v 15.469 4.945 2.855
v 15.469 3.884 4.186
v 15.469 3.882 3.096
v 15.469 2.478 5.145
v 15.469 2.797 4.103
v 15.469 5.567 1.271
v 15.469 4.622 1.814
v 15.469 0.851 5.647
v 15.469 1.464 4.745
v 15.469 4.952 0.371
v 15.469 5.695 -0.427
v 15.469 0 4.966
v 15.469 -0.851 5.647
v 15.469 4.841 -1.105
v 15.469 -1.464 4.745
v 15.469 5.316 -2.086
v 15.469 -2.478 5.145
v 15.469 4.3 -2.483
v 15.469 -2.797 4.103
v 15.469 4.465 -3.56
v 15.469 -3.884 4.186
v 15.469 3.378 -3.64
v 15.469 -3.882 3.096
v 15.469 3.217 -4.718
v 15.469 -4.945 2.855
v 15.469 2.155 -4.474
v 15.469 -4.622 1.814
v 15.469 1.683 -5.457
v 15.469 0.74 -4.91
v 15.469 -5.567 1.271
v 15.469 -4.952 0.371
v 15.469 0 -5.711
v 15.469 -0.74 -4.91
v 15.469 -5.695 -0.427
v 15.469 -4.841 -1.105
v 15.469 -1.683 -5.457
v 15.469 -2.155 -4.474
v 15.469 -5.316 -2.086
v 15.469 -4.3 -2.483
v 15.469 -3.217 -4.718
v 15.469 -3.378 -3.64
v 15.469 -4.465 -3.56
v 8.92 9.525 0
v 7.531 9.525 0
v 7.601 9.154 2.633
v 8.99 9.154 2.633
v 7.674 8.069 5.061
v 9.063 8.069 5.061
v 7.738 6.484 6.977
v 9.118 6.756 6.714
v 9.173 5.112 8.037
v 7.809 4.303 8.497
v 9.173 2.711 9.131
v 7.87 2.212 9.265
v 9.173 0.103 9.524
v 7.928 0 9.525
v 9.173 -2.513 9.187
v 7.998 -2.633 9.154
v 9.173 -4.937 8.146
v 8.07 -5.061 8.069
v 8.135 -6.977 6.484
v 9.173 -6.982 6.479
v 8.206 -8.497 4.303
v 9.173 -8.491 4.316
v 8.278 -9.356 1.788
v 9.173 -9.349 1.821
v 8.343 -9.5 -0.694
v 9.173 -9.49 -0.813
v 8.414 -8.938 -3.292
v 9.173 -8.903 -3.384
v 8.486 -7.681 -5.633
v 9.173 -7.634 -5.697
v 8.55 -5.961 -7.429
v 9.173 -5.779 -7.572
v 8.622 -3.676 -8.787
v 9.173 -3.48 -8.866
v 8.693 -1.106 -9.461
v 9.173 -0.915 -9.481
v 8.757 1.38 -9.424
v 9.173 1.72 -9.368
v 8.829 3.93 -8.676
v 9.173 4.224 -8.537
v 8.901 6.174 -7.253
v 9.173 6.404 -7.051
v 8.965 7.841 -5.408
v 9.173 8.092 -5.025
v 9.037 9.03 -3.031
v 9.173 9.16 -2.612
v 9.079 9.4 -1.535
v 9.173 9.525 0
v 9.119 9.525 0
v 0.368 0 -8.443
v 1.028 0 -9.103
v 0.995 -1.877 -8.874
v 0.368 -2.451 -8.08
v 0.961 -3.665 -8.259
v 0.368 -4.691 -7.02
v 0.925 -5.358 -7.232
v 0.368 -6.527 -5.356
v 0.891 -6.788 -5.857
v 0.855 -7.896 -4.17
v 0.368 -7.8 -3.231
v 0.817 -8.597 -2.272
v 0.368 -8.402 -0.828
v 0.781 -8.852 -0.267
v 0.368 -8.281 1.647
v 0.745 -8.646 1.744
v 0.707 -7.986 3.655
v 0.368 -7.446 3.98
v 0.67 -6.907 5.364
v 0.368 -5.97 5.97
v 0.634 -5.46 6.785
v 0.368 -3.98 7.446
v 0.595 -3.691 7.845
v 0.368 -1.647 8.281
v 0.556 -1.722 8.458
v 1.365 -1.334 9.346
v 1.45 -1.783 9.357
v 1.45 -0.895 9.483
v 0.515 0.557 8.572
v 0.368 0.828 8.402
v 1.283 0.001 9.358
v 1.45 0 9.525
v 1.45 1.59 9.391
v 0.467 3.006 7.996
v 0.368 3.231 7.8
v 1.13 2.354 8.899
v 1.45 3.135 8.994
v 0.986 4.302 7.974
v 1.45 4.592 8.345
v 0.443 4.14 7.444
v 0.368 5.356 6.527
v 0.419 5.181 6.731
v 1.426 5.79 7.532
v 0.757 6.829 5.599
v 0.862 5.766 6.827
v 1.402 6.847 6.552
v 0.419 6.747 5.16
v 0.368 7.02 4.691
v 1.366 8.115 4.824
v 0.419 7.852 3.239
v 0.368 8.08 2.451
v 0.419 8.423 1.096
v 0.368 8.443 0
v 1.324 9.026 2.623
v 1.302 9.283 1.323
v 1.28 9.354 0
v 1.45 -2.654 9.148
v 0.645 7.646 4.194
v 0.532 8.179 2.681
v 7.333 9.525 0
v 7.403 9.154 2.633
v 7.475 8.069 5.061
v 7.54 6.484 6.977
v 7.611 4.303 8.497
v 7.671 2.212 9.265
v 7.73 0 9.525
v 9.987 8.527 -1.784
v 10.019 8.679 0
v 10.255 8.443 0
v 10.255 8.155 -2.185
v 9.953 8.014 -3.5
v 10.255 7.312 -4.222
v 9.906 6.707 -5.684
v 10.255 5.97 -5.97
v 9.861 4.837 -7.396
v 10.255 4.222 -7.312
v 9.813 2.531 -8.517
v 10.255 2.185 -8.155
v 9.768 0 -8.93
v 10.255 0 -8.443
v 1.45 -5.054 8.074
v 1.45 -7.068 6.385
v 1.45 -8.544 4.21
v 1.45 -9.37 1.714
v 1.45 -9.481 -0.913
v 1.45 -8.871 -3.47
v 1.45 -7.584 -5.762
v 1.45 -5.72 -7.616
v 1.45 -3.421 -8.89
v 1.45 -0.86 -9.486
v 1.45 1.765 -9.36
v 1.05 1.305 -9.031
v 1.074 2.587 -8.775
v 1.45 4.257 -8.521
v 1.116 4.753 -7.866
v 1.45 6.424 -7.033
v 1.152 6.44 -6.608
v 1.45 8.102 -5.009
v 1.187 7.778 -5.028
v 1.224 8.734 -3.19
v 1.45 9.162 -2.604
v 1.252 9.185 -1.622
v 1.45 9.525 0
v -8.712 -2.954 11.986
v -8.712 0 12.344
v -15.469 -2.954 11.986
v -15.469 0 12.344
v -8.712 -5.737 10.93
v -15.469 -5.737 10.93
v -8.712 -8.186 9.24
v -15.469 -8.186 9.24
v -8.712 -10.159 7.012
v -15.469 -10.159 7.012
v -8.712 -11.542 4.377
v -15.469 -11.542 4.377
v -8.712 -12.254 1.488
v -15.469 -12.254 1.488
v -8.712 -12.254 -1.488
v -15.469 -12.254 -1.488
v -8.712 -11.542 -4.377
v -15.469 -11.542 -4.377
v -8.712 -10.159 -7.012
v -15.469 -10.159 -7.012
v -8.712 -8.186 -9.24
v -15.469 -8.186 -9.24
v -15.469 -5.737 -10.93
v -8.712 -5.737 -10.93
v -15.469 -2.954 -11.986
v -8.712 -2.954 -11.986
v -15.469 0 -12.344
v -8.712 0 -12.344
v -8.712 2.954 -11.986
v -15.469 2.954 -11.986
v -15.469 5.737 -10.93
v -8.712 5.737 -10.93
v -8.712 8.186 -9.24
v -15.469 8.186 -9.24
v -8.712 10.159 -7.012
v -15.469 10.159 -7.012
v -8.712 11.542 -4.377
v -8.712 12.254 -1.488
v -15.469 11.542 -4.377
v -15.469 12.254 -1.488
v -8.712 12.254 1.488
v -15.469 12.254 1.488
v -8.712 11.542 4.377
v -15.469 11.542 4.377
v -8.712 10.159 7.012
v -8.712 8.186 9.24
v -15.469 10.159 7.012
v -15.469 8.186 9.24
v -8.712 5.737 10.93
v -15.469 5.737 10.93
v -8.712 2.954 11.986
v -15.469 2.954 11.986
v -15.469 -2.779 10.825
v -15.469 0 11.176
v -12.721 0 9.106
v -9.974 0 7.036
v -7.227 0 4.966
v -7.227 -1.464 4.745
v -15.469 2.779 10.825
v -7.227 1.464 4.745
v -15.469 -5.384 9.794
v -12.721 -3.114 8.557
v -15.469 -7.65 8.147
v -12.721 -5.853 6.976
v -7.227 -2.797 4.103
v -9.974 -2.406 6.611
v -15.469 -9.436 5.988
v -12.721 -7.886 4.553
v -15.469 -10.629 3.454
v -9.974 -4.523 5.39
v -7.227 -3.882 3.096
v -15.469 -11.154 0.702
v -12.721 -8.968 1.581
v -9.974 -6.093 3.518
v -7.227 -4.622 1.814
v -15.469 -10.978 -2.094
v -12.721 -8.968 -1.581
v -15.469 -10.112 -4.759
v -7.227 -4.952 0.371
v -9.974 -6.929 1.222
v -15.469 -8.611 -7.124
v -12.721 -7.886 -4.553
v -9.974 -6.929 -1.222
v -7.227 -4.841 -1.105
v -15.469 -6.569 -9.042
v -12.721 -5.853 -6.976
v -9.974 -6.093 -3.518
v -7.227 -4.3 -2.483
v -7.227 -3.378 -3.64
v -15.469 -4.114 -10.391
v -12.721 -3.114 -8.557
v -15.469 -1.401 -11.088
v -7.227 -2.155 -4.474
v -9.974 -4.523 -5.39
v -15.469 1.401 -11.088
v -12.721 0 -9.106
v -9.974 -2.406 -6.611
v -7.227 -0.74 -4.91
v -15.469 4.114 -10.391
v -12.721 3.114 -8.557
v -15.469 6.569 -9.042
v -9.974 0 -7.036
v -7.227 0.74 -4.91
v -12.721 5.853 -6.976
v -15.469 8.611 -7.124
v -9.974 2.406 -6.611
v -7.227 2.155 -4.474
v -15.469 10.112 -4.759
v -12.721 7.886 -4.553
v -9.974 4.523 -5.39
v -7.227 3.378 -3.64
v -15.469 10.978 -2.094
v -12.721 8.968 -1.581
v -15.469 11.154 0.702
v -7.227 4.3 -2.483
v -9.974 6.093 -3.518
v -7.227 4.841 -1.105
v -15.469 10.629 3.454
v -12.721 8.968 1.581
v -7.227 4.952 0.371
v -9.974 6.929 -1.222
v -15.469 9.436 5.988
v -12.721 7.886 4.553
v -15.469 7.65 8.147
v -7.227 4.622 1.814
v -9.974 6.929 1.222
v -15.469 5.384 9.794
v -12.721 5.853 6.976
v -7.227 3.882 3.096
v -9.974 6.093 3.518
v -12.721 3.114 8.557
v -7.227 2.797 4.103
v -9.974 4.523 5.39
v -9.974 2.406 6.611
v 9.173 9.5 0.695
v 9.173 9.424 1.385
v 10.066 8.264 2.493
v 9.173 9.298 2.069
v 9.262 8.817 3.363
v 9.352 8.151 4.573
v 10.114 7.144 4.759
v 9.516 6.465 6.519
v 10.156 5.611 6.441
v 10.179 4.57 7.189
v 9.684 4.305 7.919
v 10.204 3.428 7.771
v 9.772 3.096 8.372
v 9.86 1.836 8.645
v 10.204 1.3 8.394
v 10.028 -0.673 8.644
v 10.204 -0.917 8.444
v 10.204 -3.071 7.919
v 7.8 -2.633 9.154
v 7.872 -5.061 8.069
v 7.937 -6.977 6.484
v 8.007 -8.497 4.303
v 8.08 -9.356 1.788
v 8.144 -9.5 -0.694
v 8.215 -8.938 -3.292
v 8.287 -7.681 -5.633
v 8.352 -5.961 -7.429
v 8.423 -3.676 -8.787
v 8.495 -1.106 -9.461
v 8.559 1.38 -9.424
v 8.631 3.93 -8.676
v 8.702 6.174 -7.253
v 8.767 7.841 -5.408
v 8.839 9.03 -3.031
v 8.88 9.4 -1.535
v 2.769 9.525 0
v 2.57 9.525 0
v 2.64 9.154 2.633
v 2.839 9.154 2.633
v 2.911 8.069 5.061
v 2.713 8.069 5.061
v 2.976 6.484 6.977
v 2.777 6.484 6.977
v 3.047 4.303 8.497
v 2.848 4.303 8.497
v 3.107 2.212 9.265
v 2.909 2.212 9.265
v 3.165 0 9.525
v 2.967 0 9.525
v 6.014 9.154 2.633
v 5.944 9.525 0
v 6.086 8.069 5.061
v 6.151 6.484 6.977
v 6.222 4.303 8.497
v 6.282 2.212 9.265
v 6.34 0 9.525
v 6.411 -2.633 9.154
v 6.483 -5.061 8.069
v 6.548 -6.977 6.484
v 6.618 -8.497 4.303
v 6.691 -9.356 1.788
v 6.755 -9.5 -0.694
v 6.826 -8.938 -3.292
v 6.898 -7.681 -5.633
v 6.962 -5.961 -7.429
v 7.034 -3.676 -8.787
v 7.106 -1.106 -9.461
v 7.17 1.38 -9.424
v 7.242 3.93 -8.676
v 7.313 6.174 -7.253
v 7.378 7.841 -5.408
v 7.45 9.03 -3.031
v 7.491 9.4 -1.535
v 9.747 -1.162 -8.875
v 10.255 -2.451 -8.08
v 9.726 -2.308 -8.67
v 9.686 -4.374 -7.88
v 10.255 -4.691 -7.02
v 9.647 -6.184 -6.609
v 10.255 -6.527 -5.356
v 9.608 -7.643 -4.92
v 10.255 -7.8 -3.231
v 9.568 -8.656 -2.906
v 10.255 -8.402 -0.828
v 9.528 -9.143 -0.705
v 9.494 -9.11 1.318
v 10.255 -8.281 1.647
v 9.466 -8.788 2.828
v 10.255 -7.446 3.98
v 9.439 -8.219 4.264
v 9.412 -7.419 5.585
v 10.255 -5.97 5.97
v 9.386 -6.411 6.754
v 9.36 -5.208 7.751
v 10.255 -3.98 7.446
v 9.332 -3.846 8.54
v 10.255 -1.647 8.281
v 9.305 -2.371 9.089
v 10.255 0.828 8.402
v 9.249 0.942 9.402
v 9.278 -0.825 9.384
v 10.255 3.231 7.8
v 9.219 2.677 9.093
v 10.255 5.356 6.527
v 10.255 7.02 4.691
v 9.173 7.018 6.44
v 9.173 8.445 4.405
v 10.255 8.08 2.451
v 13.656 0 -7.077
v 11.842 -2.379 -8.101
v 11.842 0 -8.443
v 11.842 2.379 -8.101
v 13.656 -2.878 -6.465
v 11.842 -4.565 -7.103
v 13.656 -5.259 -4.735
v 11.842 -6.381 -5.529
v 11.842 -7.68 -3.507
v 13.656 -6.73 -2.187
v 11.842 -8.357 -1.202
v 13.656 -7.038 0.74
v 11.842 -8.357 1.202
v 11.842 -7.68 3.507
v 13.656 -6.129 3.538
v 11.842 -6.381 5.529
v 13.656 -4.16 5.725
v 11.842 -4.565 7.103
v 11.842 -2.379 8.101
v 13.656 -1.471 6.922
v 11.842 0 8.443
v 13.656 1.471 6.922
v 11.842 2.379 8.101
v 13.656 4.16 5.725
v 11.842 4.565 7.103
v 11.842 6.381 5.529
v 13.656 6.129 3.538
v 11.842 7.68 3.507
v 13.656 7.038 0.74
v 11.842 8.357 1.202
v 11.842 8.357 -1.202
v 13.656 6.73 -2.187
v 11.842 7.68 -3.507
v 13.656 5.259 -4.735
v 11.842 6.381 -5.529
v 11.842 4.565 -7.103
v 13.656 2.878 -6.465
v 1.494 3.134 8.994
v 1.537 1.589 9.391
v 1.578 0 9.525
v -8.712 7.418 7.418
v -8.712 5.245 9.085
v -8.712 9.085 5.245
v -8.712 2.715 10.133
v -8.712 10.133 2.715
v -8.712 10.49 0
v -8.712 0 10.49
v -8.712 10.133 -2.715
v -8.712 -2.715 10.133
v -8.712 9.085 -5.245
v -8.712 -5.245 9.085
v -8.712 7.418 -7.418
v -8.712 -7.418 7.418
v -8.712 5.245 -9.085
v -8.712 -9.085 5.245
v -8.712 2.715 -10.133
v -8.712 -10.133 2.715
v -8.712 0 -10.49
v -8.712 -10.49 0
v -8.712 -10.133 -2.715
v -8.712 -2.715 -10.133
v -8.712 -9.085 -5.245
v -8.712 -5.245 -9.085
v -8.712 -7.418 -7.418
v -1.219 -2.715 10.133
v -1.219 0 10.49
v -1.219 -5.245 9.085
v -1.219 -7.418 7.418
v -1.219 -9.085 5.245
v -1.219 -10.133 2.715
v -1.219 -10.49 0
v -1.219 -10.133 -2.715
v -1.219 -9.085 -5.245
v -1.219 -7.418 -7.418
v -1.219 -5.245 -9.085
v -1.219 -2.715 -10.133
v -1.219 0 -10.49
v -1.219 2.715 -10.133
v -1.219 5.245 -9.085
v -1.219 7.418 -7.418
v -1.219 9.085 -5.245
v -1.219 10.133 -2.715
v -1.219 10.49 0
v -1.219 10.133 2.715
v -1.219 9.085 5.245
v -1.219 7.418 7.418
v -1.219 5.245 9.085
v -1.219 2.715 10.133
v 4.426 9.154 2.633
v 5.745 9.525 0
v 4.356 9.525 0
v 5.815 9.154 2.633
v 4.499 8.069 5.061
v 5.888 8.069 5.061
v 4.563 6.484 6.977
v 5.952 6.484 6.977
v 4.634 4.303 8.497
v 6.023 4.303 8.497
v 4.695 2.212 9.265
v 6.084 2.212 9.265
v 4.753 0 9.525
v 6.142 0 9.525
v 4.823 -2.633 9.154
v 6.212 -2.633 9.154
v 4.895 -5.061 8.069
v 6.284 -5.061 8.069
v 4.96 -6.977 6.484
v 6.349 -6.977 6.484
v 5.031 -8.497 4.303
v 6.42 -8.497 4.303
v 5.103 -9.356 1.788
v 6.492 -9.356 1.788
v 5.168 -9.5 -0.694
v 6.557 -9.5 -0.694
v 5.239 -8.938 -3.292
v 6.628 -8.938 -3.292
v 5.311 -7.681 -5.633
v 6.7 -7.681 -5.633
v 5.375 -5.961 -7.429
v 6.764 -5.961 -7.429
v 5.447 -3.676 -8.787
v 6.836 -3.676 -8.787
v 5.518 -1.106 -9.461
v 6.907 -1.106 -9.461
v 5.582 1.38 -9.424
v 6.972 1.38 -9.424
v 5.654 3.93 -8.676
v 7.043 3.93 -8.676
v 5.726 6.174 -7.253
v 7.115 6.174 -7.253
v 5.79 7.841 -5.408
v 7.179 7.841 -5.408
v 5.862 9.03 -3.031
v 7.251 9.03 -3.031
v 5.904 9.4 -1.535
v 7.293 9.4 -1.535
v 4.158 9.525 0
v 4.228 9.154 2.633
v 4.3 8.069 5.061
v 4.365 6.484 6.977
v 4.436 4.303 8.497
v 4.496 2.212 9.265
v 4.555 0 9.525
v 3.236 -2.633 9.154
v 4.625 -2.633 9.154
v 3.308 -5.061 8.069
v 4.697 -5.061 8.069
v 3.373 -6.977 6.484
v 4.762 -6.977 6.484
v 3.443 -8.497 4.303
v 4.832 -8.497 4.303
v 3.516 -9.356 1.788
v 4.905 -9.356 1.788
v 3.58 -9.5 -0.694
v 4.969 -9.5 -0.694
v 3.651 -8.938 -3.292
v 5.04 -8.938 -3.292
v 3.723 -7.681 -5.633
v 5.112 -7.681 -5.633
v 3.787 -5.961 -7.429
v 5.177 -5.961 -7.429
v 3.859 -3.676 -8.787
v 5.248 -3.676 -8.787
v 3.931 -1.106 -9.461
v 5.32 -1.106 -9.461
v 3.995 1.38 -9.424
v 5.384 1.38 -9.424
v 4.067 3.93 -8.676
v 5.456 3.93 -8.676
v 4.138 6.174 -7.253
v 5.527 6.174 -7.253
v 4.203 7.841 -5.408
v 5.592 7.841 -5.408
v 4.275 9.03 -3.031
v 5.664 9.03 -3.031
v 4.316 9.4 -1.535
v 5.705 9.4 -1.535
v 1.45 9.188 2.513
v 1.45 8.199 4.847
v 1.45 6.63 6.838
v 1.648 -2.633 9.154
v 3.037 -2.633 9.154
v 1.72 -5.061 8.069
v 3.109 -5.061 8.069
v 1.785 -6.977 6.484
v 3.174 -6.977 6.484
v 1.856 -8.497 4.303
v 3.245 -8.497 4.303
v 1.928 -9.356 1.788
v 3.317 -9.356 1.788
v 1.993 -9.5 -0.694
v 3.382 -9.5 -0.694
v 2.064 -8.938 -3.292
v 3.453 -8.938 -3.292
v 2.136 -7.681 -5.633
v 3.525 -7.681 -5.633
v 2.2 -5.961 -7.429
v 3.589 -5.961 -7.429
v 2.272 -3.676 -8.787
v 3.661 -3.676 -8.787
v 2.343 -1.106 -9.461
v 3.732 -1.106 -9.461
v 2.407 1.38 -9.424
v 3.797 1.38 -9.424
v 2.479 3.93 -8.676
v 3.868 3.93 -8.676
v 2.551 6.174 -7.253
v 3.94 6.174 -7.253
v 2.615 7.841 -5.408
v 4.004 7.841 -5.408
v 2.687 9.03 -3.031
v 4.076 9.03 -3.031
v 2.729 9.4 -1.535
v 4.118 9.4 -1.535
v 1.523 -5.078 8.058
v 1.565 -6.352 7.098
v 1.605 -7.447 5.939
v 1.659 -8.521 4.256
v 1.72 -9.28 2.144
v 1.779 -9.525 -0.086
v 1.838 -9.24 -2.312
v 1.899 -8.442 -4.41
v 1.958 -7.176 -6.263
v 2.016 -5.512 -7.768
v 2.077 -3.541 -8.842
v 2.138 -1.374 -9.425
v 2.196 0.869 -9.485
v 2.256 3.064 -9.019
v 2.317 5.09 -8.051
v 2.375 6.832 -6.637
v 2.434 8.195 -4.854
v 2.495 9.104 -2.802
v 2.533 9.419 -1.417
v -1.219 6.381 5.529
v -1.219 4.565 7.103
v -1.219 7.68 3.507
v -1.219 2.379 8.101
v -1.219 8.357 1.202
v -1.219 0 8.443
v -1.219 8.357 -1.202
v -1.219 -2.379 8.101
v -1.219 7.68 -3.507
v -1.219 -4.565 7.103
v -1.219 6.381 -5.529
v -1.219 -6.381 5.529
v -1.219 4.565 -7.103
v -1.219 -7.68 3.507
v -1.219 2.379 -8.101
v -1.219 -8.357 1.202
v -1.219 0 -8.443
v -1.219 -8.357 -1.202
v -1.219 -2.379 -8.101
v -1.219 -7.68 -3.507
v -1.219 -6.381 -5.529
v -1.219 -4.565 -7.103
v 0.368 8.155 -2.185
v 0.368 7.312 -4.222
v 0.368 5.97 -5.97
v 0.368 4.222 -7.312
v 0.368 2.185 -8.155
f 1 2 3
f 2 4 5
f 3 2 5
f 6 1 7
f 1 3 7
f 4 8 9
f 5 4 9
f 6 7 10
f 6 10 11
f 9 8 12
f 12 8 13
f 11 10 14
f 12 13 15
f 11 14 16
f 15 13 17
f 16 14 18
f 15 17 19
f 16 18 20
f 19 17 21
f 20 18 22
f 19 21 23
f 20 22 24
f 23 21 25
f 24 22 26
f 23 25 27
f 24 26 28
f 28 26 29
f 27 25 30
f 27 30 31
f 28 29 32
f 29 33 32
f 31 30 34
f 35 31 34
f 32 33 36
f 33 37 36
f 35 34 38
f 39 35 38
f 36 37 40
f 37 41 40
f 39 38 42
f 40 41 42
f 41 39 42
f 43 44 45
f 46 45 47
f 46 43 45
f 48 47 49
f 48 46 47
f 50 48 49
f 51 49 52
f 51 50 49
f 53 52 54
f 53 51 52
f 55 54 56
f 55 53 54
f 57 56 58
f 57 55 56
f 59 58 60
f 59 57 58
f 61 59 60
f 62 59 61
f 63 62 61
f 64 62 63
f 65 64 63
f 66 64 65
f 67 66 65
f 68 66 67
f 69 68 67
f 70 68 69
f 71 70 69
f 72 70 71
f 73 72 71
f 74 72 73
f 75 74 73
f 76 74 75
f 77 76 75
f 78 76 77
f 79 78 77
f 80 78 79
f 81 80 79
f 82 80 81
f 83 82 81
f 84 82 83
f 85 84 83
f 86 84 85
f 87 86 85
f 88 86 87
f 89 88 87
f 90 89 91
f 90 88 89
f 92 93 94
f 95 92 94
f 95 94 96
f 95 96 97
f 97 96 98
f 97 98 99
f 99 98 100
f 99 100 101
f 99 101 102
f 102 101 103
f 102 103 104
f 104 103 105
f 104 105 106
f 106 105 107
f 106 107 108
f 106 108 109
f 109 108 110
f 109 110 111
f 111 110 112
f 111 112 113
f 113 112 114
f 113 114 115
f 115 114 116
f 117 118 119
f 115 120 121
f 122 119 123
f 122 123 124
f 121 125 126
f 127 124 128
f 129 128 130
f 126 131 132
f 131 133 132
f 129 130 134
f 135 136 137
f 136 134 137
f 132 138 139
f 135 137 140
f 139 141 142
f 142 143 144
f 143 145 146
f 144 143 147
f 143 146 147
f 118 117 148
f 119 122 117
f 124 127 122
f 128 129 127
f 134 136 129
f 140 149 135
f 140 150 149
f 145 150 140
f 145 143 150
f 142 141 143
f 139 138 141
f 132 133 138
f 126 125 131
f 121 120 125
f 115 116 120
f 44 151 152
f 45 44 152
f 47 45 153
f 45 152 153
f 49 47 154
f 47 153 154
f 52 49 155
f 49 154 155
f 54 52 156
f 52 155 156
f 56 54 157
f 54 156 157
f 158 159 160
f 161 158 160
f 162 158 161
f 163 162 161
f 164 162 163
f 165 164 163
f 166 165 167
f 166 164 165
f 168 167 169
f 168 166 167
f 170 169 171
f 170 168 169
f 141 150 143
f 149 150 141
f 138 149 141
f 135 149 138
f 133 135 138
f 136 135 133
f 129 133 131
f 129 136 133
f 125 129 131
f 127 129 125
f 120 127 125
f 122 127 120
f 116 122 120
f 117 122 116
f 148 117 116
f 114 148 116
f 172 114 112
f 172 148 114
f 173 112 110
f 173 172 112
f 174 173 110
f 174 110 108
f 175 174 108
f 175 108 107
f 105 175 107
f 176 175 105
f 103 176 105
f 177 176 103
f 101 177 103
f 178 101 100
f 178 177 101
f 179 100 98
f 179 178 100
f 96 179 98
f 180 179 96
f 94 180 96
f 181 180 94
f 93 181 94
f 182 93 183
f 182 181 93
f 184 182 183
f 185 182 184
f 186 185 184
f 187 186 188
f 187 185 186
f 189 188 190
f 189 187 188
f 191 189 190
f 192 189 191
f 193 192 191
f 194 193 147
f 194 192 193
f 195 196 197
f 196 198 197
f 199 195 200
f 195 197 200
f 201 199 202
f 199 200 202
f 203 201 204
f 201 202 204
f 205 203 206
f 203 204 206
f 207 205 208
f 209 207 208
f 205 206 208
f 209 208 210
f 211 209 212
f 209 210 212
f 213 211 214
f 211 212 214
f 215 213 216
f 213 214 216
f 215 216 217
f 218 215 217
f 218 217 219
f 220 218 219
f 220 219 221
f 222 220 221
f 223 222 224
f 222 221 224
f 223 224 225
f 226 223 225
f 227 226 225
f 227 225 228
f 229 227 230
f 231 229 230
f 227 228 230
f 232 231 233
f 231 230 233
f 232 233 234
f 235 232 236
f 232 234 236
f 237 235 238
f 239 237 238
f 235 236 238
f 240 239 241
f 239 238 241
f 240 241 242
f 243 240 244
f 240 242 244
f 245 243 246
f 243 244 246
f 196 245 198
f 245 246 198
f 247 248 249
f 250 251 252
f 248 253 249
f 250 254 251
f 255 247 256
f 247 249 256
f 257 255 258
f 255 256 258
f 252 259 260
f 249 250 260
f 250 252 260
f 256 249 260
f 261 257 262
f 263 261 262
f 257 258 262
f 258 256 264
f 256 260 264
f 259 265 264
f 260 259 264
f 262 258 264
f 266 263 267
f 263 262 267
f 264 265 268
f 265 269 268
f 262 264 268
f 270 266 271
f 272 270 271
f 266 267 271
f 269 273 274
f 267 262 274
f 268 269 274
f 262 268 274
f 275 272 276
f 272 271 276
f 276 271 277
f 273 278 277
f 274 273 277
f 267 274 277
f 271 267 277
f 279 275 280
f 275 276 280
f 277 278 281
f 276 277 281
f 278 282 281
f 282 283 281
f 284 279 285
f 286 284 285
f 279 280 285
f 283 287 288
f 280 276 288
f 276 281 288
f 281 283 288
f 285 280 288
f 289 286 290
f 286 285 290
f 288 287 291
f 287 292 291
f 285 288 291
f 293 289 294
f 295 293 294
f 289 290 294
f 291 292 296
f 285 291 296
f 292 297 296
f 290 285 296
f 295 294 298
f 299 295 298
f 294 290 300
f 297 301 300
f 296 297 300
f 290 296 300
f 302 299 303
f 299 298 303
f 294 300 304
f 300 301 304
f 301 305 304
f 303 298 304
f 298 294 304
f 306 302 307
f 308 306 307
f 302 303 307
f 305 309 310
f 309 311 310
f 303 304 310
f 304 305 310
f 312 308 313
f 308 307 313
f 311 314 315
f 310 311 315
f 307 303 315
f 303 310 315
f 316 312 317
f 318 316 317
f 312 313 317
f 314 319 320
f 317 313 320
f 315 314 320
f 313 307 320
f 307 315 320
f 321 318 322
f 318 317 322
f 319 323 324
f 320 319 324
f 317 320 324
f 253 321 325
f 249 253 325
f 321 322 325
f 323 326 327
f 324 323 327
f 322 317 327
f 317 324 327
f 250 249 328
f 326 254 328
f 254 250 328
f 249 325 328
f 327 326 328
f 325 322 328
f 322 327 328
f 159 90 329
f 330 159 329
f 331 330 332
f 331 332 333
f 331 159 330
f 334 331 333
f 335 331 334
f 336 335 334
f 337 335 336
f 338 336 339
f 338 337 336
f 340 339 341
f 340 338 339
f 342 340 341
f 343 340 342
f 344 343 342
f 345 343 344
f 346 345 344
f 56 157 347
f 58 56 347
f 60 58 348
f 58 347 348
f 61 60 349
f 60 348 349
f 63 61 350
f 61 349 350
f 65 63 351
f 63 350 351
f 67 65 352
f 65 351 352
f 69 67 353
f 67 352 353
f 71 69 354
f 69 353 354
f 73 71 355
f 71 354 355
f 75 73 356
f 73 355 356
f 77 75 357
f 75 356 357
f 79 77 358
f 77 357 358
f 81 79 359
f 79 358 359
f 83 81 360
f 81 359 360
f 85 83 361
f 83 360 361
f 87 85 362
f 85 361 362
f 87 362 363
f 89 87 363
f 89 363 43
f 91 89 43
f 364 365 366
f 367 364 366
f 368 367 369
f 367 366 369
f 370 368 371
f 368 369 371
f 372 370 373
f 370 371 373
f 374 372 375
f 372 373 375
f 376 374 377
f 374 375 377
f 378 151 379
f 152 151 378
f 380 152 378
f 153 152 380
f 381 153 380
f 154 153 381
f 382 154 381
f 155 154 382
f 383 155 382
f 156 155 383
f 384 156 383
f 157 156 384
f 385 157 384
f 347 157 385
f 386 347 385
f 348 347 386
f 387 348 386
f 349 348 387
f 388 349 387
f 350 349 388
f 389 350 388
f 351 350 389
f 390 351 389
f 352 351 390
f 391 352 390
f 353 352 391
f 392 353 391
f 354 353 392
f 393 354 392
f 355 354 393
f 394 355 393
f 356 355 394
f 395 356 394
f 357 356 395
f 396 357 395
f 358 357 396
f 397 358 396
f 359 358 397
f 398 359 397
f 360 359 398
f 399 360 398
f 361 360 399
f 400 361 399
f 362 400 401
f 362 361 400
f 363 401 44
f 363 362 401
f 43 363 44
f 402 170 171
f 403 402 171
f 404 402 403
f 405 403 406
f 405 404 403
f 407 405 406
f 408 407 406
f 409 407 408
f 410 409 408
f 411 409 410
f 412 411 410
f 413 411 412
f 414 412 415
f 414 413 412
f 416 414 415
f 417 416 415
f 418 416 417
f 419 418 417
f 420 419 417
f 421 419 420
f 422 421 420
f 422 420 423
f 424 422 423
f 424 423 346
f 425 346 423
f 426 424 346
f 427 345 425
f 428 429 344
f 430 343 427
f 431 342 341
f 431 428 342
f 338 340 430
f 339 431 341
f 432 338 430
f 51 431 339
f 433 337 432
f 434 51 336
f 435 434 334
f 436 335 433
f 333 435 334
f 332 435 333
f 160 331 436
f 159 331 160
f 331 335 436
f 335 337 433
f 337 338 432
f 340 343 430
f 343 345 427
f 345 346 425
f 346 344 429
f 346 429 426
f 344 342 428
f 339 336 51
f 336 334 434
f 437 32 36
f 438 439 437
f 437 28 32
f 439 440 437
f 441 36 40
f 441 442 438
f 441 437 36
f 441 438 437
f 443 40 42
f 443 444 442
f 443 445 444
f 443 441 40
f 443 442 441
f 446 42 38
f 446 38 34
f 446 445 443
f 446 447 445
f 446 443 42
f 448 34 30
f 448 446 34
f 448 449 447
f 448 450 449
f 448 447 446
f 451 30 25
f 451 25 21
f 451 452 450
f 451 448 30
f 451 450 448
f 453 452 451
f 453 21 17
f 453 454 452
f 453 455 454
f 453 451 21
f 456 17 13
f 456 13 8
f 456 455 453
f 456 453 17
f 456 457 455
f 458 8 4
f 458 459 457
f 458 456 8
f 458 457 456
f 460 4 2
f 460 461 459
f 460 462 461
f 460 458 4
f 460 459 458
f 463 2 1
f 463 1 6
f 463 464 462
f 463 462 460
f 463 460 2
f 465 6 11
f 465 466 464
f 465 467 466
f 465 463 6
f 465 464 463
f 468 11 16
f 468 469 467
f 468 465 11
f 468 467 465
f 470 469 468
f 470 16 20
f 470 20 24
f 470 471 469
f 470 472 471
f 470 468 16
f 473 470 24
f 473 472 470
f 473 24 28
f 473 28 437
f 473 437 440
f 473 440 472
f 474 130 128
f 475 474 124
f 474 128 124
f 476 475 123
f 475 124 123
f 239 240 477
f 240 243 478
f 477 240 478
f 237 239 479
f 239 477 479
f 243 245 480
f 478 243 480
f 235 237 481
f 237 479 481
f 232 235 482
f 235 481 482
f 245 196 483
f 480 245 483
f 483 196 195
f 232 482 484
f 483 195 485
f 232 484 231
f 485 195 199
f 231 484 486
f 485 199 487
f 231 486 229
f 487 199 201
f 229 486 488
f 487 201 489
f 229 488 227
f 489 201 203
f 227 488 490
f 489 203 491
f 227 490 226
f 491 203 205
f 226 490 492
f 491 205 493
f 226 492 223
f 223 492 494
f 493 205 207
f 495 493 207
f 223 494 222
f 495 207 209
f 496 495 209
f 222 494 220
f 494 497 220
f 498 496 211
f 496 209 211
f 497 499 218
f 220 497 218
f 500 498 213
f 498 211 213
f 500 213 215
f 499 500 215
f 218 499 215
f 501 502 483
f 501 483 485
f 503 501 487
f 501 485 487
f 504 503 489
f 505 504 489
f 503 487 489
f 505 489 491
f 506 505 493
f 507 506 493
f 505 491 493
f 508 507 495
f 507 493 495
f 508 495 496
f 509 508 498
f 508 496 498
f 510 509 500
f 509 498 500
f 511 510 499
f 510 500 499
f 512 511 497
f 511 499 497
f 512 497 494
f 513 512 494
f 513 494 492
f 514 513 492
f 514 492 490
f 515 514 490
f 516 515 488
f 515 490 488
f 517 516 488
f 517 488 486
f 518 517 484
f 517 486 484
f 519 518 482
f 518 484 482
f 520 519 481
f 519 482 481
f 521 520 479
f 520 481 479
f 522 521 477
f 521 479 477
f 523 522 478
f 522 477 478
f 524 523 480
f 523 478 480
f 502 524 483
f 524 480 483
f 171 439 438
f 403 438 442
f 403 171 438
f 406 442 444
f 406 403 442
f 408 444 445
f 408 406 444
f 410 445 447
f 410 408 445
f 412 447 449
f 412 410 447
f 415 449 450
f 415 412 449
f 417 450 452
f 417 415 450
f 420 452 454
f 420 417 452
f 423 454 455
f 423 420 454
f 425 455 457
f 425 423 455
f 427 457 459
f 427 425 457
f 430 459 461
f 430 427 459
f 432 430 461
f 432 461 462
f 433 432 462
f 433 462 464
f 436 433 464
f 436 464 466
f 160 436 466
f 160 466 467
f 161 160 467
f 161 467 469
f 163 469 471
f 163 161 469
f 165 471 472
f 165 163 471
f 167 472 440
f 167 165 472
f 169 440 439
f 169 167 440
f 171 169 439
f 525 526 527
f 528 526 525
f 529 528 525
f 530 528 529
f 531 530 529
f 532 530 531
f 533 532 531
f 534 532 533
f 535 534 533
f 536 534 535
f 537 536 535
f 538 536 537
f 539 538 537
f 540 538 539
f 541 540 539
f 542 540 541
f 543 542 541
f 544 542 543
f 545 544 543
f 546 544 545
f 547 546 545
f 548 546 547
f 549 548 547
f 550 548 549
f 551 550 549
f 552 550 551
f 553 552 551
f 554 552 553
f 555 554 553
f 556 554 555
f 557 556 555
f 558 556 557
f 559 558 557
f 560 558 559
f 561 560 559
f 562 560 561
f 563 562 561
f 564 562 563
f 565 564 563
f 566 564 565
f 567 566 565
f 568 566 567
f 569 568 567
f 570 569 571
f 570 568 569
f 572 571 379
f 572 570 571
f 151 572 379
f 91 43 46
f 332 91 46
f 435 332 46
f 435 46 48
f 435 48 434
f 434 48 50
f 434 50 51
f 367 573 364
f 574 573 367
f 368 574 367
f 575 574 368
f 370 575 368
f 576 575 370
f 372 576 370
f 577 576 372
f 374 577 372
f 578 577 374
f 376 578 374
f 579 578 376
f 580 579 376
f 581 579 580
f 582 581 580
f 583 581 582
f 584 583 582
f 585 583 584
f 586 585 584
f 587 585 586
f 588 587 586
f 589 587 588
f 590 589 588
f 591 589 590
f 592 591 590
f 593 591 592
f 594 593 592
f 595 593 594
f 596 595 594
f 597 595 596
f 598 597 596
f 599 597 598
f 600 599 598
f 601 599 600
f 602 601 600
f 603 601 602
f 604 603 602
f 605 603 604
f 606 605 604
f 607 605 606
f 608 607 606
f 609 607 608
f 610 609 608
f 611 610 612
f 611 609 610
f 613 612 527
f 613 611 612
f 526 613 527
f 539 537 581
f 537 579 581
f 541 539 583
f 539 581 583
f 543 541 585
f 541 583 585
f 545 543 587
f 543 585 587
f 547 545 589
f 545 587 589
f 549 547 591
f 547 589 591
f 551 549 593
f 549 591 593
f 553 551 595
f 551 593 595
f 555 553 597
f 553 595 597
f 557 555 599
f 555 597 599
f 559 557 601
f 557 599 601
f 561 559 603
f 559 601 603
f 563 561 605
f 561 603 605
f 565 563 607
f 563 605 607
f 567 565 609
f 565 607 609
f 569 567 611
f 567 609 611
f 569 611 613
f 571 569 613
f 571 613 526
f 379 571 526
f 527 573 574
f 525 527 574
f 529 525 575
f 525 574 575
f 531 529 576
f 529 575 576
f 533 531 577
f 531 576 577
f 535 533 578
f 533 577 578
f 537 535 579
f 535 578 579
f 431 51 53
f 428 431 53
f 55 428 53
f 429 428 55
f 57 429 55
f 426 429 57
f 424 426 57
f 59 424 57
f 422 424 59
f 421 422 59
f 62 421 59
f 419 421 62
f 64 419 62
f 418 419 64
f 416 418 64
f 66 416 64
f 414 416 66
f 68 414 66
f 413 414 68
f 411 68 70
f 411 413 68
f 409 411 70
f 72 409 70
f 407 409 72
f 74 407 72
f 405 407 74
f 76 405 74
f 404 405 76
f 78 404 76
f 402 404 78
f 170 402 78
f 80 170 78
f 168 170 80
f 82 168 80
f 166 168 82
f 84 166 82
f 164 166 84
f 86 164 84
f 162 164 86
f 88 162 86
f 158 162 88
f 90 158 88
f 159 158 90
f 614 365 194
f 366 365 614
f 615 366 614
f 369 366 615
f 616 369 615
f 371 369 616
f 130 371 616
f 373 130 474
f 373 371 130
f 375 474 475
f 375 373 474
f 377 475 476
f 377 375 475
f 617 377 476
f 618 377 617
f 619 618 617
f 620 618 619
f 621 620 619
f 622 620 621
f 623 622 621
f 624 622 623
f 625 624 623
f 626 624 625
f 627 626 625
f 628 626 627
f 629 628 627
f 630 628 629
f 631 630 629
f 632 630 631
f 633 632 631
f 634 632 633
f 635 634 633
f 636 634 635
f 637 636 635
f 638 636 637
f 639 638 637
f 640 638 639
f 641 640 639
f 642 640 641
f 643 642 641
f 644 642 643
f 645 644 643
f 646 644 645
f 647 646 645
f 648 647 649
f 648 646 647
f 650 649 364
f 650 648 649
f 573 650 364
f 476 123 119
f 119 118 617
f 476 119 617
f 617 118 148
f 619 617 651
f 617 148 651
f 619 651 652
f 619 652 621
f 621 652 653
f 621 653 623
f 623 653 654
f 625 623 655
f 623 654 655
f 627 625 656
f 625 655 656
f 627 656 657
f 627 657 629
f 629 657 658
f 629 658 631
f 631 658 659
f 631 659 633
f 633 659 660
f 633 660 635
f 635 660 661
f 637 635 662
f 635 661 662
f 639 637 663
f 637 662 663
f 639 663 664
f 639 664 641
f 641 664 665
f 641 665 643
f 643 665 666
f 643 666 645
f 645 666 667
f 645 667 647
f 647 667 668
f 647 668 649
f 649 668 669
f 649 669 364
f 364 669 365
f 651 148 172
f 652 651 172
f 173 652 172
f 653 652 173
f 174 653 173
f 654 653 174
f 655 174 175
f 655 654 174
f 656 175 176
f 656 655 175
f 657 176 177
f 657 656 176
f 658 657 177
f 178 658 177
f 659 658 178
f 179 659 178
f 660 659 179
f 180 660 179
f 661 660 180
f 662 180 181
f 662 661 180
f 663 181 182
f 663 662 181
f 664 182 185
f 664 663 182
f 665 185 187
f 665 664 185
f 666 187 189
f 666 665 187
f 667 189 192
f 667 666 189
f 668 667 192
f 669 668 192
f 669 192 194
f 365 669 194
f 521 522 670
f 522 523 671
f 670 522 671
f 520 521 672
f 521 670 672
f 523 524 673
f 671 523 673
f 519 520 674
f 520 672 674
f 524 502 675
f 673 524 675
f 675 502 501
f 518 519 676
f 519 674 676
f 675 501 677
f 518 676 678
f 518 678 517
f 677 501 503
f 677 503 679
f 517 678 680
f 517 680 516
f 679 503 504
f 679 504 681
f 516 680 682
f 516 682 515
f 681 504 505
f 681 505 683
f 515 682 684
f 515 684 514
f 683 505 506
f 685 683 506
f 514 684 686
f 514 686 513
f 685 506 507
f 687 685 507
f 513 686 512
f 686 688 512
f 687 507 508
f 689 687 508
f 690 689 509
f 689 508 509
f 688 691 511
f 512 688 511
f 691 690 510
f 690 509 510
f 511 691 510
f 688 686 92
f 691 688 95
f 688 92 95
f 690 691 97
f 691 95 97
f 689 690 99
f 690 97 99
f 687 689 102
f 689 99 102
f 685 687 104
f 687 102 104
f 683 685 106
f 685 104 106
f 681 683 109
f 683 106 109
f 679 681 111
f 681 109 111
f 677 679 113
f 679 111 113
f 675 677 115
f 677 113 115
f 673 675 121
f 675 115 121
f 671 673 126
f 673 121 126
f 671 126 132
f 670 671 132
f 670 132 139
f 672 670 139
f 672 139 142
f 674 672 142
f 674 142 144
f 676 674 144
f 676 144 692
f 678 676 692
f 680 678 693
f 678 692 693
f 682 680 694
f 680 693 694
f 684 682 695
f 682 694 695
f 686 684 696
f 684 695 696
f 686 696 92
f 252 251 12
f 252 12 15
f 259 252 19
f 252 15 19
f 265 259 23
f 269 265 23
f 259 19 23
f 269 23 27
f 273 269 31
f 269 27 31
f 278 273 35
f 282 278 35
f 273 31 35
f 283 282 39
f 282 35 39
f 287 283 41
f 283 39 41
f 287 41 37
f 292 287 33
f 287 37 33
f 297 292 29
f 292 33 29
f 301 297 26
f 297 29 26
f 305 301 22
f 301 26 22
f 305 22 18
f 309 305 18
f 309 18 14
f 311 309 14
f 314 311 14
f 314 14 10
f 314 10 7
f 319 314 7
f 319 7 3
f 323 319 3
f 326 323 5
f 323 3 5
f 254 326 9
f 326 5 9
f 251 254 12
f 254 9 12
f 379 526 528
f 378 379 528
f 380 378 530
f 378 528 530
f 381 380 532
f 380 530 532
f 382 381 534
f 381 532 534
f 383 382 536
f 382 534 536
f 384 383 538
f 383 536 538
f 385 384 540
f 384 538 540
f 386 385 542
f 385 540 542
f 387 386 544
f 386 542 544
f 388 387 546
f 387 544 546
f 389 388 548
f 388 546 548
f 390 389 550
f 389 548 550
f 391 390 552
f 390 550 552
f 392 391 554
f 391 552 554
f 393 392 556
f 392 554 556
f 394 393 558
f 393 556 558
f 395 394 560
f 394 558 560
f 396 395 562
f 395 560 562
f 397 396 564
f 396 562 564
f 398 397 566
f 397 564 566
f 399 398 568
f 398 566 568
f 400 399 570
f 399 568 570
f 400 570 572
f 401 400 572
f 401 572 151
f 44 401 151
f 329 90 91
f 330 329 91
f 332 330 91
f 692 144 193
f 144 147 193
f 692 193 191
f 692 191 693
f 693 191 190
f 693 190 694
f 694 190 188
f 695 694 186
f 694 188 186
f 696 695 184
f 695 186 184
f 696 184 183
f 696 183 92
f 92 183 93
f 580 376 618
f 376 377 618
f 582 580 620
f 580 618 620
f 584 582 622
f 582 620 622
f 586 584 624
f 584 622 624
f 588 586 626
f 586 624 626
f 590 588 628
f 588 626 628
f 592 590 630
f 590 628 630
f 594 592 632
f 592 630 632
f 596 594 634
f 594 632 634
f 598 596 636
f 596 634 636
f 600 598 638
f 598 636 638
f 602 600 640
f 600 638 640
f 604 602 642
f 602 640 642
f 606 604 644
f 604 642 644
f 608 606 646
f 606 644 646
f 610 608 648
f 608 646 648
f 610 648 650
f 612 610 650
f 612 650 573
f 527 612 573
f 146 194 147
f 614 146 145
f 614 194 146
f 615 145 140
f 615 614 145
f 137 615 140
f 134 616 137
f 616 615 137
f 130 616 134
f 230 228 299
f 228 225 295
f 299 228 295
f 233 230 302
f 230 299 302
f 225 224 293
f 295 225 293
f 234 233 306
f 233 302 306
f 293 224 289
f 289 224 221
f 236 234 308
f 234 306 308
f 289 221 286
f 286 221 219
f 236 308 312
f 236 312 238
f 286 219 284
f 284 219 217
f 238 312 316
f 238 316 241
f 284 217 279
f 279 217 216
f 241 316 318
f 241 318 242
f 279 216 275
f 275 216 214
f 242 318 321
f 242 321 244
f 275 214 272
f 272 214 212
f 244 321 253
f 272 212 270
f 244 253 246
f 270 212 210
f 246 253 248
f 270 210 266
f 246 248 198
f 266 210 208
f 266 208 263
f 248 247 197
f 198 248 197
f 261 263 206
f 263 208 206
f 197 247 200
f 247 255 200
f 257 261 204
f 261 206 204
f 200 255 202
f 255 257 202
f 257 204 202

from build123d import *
from build123d.topology import SkipClean

# Parameters (mm, degrees)
CUT_SWEEP1_PITCH = 1.5875
CUT_SWEEP1_TO    = 16.6878


with BuildPart() as part:
    # Sketch1 → Revolve1 (revolve)
    with BuildSketch(Plane.XY, mode=Mode.PRIVATE) as revolve1_sk:
        Polygon((-15.4686, 12.3444), (-15.4686, 11.176), (-7.227253544, 4.9657), (15.4686, 4.9657), (15.4686, 5.710555), (15.4686, 9.525), (10.406660515, 9.525), (-1.2192, 9.525), (-1.2192, 10.4902), (-8.7122, 10.4902), (-8.7122, 12.3444), align=None)
    revolve(revolve1_sk.sketch.rotate(Axis((-15.4686, 0, 0), (1, 0, 0)), 90), axis=Axis((-15.4686, 0, 0), (1, 0, 0)))

    # Cut-Sweep1: arcs per turn and ends read off the stored shape
    # Cut-Sweep1: the profile of Sketch4 profile screwed along a right-hand helix through 12.5 turns, 8 arcs to a turn; built about Z, then put on its axis
    cut_sweep1_z = Axis((0, 0, 0), (0, 0, 1))
    cut_sweep1_corners = [(9.5253, 0, -1.587326795), (9.5253, 0, -2.976735705), (8.493888504, 0, -2.38125), (8.493888504, 0, -2.1828125)]
    with BuildLine(mode=Mode.PRIVATE) as cut_sweep1_profile:
        Line(cut_sweep1_corners[0], cut_sweep1_corners[1])
        Line(cut_sweep1_corners[1], cut_sweep1_corners[2])
        Line(cut_sweep1_corners[2], cut_sweep1_corners[3])
        Line(cut_sweep1_corners[3], cut_sweep1_corners[0])
    cut_sweep1_cap = Face(cut_sweep1_profile.wire())
    cut_sweep1_turn_angles = [0, 22.5, 45, 67.5, 90, 112.5, 135, 157.5, 180, 202.5, 225, 247.5, 270, 292.5, 315, 337.5, 360]
    cut_sweep1_turn_weights = [1, 0.9238795325112867, 1, 0.9238795325112867, 1, 0.9238795325112867, 1, 0.9238795325112867, 1, 0.9238795325112867, 1, 0.9238795325112867, 1, 0.9238795325112867, 1, 0.9238795325112867, 1]
    cut_sweep1_turn_rails = [Edge.make_bspline([Vector(p[0], p[1], 0).rotate(cut_sweep1_z, cut_sweep1_turn_angles[k]) / cut_sweep1_turn_weights[k] + Vector(0, 0, p[2] + CUT_SWEEP1_PITCH * cut_sweep1_turn_angles[k] / 360) for k in range(17)], [0, 0, 0, 1, 1, 2, 2, 3, 3, 4, 4, 5, 5, 6, 6, 7, 7, 8, 8, 8], 2, cut_sweep1_turn_weights) for p in cut_sweep1_corners]
    cut_sweep1_turn_sides = [Face.make_surface_from_curves(cut_sweep1_turn_rails[p[0]], cut_sweep1_turn_rails[p[1]]) for p in [(0, 1), (1, 2), (2, 3), (3, 0)]]
    cut_sweep1_last_angles = [4320, 4342.5, 4365, 4387.5, 4410, 4432.5, 4455, 4477.5, 4500]
    cut_sweep1_last_weights = [1, 0.9238795325112867, 1, 0.9238795325112867, 1, 0.9238795325112867, 1, 0.9238795325112867, 1]
    cut_sweep1_last_rails = [Edge.make_bspline([Vector(p[0], p[1], 0).rotate(cut_sweep1_z, cut_sweep1_last_angles[k]) / cut_sweep1_last_weights[k] + Vector(0, 0, p[2] + CUT_SWEEP1_PITCH * cut_sweep1_last_angles[k] / 360) for k in range(9)], [0, 0, 0, 1, 1, 2, 2, 3, 3, 4, 4, 4], 2, cut_sweep1_last_weights) for p in cut_sweep1_corners]
    cut_sweep1_last_sides = [Face.make_surface_from_curves(cut_sweep1_last_rails[p[0]], cut_sweep1_last_rails[p[1]]) for p in [(0, 1), (1, 2), (2, 3), (3, 0)]]
    cut_sweep1 = Plane(origin=(15.4686, 0, 0), x_dir=(0, 1, 0), z_dir=(-1, 0, 0)) * split(Solid(Shell([*[p.moved(Location((0, 0, CUT_SWEEP1_PITCH * i))) for i in range(12) for p in cut_sweep1_turn_sides], *cut_sweep1_last_sides, cut_sweep1_cap, cut_sweep1_cap.rotate(cut_sweep1_z, 4500).moved(Location((0, 0, CUT_SWEEP1_PITCH * 4500 / 360)))])), bisect_by=Plane.XY.offset(CUT_SWEEP1_TO), keep=Keep.BOTTOM, mode=Mode.PRIVATE)
    add(cut_sweep1, mode=Mode.SUBTRACT)

    # Sketch5 → Cut-Revolve1 (revolve, cut)
    with BuildSketch(Plane.XY, mode=Mode.PRIVATE) as cut_revolve1_sk:
        Polygon((15.4686, 5.710555), (11.842405564, 8.443088504), (10.254905564, 8.443088504), (9.172994068, 9.525), (15.4686, 9.525), align=None)
        Polygon((-1.2192, 9.525), (-1.2192, 8.443088504), (0.3683, 8.443088504), (1.450211496, 9.525), align=None)
    revolve(cut_revolve1_sk.sketch.rotate(Axis((0, 0, 0), (-1, 0, 0)), 90), axis=Axis((0, 0, 0), (-1, 0, 0)), mode=Mode.SUBTRACT)

    # Revolve2: read off the stored shape, not the designer's step
    # Revolve2 outline → Revolve2 (revolve)
    with SkipClean():  # the faces are left unmerged after this step: merging them gives an invalid solid
        with BuildSketch(Plane.YX):
            Polygon((9.525, 1.450211496), (9.525, 9.172994068), (8.443088504, 10.254905564), (8.443088504, 0.3683), align=None)
        revolve(axis=Axis((0, 0, 0), (1, 0, 0)))


solid = part.part
